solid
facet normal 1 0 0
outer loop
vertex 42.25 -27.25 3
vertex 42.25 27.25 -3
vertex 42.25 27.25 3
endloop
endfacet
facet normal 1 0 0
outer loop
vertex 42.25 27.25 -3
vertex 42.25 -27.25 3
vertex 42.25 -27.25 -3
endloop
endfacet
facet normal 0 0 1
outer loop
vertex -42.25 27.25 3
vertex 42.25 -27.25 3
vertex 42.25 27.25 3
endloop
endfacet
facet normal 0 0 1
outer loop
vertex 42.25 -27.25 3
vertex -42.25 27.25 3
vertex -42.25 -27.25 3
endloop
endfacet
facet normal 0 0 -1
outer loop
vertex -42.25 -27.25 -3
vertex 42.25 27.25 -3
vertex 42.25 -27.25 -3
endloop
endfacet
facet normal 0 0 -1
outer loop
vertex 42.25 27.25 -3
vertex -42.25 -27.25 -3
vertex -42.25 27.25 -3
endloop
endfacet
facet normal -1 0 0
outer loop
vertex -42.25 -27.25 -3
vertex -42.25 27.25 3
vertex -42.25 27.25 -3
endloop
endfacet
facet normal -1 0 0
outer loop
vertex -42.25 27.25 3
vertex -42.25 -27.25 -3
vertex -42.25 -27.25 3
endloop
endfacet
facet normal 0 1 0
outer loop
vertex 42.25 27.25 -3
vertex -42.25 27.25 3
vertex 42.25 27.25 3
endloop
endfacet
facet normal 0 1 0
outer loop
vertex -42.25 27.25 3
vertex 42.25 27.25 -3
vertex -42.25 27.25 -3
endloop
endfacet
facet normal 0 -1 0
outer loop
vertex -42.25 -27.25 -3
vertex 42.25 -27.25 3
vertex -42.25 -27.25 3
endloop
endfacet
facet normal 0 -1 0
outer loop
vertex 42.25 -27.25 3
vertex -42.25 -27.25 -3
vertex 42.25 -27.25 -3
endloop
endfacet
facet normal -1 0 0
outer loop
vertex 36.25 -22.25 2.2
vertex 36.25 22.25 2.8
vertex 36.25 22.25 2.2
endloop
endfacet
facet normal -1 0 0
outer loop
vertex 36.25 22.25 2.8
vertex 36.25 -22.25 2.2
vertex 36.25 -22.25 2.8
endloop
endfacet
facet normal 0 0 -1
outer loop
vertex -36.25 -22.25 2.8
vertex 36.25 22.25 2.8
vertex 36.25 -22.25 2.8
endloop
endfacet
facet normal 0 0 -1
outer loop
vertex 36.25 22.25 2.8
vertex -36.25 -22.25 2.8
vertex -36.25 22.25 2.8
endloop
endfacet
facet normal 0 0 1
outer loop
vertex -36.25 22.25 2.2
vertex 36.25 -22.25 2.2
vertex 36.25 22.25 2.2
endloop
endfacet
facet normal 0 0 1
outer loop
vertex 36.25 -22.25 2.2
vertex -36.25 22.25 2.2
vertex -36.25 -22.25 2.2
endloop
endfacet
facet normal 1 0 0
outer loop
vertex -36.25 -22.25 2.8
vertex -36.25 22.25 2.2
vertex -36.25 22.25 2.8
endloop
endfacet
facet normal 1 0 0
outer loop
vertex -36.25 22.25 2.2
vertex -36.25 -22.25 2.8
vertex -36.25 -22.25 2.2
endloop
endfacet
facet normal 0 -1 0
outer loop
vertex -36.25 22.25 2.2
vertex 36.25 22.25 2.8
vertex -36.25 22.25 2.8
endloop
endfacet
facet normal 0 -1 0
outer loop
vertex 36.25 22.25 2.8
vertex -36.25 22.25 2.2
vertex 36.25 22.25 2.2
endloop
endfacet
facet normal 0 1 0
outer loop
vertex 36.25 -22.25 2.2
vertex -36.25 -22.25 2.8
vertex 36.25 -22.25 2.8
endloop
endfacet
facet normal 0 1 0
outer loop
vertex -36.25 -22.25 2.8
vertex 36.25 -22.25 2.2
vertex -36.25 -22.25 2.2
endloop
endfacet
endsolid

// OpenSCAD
// Parameters
width_mm = 84.5; //[42.25:169:0.1]
height_mm = 54.5; //[27.25:109:0.1]
thickness_mm = 6; //[3:12:0.1]
corner_radius_mm = 0.5; //[0:5:0.1]
front_face_thickness_mm = 0.8; //[0.2:2:0.1]
rear_face_thickness_mm = 0.8; //[0.2:2:0.1]
face_overlap_mm = 1; //[0.5:2:0.1]
display_recess_depth_mm = 0.6; //[0.2:2:0.1]
aperture_margin_x_mm = 6; //[2:15:0.1]
aperture_margin_y_mm = 5; //[2:15:0.1]
aperture_corner_radius_mm = 0.5; //[0:3:0.1]
pcb_offset_mm = 1.5; //[0:5:0.1]
mount_hole_diameter_mm = 3; //[2:6:0.1]

// Display module body
module display_module_body() {
  color([0.85, 0.85, 0.8]) {
    cube([width_mm, height_mm, thickness_mm], center=true);
  }
}

// Front face
module front_face() {
  color([0.75, 0.75, 0.77]) {
    translate([0, 0, thickness_mm/2 + front_face_thickness_mm/2 - face_overlap_mm])
      cube([width_mm, height_mm, front_face_thickness_mm], center=true);
  }
}

// Rear face reference plane
module rear_face_reference_plane() {
  color([0.75, 0.75, 0.77]) {
    translate([0, 0, -thickness_mm/2 - rear_face_thickness_mm/2 + face_overlap_mm])
      cube([width_mm, height_mm, rear_face_thickness_mm], center=true);
  }
}

// Display recess
module display() {
  color([0.1, 0.1, 0.6]) {
    translate([0, 0, thickness_mm/2 + front_face_thickness_mm - display_recess_depth_mm/2 - face_overlap_mm])
      cube([width_mm - 2*aperture_margin_x_mm, height_mm - 2*aperture_margin_y_mm, display_recess_depth_mm], center=true);
  }
}

// Mod - Union of body and faces
module mod() {
  union() {
    display_module_body();
    front_face();
    rear_face_reference_plane();
  }
}

// Mod with display recess
module mod_with_display_recess() {
  difference() {
    mod();
    display();
  }
}

// Assembly
module assembly() {
  mod_with_display_recess();
}

assembly();
